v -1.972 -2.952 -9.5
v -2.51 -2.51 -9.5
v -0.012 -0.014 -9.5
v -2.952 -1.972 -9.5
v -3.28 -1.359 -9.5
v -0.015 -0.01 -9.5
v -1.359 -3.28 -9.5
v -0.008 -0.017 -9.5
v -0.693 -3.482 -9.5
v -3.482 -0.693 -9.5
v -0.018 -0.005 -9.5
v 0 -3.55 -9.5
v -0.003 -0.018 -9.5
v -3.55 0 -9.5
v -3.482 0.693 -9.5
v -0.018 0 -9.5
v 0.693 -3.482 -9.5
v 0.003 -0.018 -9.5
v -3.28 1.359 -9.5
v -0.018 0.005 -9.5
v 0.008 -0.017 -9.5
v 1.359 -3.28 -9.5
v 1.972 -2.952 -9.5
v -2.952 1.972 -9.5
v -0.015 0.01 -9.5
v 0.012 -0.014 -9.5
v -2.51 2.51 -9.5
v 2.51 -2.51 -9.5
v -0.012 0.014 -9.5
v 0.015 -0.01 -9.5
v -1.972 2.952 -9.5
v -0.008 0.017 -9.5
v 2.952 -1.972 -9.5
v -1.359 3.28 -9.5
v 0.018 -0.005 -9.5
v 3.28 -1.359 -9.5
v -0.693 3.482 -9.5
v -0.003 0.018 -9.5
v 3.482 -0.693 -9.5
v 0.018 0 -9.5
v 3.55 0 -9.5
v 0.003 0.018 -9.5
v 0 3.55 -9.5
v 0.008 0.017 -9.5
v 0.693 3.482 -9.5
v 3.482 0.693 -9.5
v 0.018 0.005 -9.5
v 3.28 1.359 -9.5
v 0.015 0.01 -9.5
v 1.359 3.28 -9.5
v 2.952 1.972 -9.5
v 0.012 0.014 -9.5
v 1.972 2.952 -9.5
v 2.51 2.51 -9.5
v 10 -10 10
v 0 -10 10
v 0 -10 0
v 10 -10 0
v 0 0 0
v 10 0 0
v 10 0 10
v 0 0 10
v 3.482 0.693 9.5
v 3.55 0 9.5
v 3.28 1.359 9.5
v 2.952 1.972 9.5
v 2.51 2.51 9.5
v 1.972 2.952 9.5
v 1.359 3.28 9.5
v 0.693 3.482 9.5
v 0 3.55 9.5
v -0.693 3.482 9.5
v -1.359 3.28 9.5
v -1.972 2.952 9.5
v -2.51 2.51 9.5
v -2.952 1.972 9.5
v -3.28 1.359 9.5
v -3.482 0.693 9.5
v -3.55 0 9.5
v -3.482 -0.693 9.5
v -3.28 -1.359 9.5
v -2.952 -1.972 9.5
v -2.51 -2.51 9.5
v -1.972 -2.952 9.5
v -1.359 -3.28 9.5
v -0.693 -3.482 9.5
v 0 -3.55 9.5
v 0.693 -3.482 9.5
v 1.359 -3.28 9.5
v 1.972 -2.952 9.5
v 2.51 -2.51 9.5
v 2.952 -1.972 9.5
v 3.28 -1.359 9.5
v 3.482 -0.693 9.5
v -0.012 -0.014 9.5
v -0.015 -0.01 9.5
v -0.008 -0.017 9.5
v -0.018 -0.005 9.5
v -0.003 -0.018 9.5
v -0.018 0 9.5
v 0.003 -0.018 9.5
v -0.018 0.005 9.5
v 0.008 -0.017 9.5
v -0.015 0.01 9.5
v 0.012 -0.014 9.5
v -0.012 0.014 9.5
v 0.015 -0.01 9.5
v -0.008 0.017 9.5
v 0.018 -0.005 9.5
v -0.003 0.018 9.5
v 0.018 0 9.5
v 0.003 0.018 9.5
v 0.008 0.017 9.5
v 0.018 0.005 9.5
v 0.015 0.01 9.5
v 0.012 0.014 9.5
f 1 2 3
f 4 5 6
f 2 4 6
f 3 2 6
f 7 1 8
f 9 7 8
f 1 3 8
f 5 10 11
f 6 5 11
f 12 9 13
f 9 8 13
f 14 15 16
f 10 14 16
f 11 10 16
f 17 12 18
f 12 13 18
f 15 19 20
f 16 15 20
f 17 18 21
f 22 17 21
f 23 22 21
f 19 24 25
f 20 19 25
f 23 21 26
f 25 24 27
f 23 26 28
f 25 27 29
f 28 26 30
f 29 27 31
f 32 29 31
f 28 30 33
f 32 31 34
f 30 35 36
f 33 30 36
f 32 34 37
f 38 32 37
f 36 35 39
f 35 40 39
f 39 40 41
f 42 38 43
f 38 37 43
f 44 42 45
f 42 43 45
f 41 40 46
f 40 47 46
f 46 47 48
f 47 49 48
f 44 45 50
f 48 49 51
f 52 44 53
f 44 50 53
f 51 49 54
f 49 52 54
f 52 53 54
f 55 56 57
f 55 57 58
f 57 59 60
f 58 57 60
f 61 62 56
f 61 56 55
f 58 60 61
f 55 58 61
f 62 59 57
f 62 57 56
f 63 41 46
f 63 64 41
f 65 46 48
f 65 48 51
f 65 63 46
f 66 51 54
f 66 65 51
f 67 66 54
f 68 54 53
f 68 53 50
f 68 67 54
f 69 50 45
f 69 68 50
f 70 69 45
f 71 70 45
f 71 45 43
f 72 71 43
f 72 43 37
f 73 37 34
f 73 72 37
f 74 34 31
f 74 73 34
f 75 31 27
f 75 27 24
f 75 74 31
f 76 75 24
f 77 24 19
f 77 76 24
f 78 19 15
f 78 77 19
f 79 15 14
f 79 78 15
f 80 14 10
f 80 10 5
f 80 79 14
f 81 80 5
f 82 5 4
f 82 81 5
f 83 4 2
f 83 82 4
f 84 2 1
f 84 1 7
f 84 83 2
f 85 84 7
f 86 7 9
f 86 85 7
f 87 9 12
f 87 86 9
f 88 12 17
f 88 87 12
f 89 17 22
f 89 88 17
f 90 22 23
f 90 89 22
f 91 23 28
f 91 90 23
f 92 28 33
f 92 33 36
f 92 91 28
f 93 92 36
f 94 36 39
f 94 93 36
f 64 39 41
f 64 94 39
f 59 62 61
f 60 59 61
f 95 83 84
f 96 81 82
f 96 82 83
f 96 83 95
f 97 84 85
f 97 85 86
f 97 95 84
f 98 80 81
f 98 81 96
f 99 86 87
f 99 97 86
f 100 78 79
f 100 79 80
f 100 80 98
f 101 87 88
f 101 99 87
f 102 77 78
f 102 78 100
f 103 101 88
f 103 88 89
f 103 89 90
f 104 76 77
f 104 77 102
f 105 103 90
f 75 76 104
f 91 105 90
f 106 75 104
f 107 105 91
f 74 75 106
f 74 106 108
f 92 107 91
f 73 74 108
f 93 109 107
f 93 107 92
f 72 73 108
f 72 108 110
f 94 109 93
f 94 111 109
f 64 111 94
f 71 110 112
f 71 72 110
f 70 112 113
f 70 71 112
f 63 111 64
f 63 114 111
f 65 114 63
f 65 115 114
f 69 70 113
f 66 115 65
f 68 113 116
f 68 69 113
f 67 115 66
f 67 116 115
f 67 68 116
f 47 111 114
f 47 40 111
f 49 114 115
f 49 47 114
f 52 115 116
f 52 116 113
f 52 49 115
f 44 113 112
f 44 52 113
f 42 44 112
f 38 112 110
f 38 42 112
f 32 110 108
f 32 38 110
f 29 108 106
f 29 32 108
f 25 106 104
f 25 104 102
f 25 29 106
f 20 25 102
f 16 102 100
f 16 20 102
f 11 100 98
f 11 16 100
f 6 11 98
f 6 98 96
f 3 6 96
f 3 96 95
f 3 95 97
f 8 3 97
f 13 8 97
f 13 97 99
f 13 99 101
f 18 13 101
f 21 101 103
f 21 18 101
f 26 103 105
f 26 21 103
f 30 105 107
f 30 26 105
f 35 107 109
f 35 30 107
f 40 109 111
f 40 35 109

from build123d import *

# Parameters (mm, degrees)
F0_R     = 3.55
F0_R_2   = 0.018281
F1_DEPTH = 9.5
F2_W     = 10
F2_H     = 10
F3_DEPTH = 10


with BuildPart() as f1:
    # F0 (on Top) → F1 (new body, symmetric)
    with BuildSketch(Plane.XY):
        Circle(F0_R)
        Circle(F0_R_2, mode=Mode.SUBTRACT)
    extrude(amount=F1_DEPTH, both=True)


with BuildPart() as f3:
    # F2 (on Front) → F3 (new body)
    with BuildSketch(Plane.XZ):
        with Locations((5, 5)):
            Rectangle(F2_W, F2_H)
    extrude(amount=F3_DEPTH)


solid = Compound([f1.part, f3.part])
